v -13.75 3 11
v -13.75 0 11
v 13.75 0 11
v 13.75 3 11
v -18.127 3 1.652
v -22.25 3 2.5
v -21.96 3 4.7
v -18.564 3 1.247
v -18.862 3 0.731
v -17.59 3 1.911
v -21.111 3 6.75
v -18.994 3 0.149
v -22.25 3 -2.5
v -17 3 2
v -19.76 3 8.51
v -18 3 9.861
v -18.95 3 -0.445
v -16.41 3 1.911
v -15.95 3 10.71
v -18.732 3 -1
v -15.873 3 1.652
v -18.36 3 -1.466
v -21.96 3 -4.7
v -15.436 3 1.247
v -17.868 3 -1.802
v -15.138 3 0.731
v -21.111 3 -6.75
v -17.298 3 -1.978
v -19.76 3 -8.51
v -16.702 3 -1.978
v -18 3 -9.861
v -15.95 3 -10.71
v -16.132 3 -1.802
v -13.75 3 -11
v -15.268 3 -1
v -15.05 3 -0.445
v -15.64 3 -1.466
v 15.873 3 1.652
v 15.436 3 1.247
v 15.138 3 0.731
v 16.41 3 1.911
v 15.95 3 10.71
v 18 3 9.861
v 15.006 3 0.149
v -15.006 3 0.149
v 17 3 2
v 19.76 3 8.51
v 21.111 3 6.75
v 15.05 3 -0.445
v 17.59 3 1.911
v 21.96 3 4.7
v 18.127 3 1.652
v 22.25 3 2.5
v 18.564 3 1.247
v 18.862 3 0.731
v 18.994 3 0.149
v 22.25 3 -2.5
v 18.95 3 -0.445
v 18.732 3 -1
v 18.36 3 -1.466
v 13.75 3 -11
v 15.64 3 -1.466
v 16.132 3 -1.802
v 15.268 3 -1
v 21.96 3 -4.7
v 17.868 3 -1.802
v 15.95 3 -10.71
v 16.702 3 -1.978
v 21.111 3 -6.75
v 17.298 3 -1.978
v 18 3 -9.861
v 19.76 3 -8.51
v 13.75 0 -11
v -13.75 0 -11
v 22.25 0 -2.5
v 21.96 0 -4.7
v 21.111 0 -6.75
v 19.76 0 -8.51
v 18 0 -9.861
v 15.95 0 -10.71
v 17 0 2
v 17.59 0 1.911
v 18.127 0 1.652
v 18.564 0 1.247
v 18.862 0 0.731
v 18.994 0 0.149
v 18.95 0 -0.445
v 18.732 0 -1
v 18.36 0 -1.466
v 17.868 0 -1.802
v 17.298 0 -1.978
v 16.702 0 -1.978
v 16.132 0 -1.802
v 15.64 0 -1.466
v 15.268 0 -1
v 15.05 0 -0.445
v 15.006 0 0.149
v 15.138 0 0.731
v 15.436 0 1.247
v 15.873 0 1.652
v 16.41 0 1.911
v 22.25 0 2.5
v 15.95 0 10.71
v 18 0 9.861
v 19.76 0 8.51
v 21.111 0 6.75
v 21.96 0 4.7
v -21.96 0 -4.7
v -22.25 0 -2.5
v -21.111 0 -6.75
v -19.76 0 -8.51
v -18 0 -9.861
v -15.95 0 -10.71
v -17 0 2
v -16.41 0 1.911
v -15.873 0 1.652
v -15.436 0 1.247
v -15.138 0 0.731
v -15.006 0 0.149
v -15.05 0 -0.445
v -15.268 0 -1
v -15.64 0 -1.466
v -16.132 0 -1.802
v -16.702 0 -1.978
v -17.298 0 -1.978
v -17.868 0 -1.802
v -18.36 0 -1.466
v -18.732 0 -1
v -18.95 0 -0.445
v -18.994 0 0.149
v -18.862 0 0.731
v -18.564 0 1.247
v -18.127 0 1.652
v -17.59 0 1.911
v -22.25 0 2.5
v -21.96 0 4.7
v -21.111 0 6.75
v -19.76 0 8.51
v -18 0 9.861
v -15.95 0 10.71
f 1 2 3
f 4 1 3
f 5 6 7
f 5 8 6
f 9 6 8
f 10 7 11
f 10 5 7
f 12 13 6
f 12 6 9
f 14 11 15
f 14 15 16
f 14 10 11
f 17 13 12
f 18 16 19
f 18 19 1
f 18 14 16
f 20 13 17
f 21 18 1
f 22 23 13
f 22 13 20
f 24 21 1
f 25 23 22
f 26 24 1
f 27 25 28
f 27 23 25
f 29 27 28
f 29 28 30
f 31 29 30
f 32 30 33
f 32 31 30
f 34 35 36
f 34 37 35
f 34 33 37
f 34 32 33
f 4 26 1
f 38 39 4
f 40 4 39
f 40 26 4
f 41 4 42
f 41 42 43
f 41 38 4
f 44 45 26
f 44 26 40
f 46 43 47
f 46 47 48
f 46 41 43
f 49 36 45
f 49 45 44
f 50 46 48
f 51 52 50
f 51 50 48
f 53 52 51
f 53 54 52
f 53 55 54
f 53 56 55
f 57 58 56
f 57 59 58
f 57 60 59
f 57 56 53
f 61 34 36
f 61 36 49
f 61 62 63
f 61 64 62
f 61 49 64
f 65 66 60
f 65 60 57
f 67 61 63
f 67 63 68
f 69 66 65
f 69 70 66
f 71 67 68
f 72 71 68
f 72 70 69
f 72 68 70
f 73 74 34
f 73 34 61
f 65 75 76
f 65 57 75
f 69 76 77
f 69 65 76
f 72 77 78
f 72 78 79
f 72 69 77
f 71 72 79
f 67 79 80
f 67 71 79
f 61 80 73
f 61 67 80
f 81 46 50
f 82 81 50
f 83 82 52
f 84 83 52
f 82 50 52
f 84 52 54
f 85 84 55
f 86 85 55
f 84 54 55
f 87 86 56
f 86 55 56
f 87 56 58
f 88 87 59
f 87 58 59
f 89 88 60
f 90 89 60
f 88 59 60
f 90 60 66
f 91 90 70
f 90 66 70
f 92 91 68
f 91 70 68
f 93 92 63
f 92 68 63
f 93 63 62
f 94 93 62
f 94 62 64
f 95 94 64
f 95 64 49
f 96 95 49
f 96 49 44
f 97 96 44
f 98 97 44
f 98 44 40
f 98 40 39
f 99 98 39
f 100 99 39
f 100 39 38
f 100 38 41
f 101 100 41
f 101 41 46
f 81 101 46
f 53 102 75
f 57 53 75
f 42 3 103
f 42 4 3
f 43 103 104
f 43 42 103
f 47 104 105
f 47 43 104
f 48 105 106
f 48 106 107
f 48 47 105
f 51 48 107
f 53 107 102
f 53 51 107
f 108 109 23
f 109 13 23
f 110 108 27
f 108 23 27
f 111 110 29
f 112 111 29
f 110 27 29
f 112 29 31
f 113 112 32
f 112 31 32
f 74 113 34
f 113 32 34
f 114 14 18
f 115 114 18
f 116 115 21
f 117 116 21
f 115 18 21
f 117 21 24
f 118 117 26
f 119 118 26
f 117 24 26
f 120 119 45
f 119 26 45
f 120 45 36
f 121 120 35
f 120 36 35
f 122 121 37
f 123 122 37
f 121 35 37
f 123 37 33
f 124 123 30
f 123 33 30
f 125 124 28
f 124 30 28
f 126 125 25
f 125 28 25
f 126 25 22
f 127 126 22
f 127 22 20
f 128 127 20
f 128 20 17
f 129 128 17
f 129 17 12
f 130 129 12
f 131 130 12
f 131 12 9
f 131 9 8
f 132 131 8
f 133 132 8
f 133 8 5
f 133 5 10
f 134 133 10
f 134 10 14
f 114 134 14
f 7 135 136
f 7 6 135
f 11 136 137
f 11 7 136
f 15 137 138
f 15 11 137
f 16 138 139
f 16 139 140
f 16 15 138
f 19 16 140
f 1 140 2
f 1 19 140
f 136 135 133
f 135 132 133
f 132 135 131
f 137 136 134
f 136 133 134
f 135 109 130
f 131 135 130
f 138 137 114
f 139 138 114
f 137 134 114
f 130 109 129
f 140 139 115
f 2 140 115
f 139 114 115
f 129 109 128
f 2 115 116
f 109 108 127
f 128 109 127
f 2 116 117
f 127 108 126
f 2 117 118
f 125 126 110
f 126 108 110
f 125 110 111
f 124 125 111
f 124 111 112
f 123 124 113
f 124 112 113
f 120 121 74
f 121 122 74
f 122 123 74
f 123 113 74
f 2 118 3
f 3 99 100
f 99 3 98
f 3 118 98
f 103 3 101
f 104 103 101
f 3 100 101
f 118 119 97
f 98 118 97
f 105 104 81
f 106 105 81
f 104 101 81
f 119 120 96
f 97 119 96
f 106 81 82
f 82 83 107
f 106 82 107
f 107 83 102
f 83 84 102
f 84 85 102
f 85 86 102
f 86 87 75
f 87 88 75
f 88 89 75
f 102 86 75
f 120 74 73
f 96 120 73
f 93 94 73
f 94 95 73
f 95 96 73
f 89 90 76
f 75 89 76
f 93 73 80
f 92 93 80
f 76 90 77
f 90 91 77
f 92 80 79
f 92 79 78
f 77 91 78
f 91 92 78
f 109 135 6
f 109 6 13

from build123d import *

# Parameters (mm, degrees)
ESBO_O1_W                = 44.5
ESBO_O1_H                = 22
RESSALTO_EXTRUS_O1_DEPTH = 3
FILETE1_R                = 8.5
ESBO_O2_R                = 2
CORTE_EXTRUS_O1_DEPTH    = 26.001249969


with BuildPart() as part:
    # Esboço1 → Ressalto-extrusão1 (new body)
    with BuildSketch(Plane(origin=(0, 0, 0), x_dir=(1, 0, 0), z_dir=(0, 1, 0))):
        Rectangle(ESBO_O1_W, ESBO_O1_H)
    extrude(amount=RESSALTO_EXTRUS_O1_DEPTH)

    # Filete1
    filete1_edges = [part.edges().sort_by_distance(p)[0] for p in [
        (22.25, 1.5, 11),
        (-22.25, 1.5, 11),
        (-22.25, 1.5, -11),
        (22.25, 1.5, -11),
    ]]
    fillet(filete1_edges, radius=FILETE1_R)

    # Esboço2 → Corte-extrusão1 (cut, through all)
    with BuildSketch(Plane(origin=(0, 3, 0), x_dir=(1, 0, 0), z_dir=(0, 1, 0))):
        with Locations(Location((-17, 0, 0), (0, 0, 270))):
            Circle(ESBO_O2_R)
        with Locations(Location((17, 0, 0), (0, 0, 270))):
            Circle(ESBO_O2_R)
    extrude(amount=-CORTE_EXTRUS_O1_DEPTH, mode=Mode.SUBTRACT)


solid = part.part
